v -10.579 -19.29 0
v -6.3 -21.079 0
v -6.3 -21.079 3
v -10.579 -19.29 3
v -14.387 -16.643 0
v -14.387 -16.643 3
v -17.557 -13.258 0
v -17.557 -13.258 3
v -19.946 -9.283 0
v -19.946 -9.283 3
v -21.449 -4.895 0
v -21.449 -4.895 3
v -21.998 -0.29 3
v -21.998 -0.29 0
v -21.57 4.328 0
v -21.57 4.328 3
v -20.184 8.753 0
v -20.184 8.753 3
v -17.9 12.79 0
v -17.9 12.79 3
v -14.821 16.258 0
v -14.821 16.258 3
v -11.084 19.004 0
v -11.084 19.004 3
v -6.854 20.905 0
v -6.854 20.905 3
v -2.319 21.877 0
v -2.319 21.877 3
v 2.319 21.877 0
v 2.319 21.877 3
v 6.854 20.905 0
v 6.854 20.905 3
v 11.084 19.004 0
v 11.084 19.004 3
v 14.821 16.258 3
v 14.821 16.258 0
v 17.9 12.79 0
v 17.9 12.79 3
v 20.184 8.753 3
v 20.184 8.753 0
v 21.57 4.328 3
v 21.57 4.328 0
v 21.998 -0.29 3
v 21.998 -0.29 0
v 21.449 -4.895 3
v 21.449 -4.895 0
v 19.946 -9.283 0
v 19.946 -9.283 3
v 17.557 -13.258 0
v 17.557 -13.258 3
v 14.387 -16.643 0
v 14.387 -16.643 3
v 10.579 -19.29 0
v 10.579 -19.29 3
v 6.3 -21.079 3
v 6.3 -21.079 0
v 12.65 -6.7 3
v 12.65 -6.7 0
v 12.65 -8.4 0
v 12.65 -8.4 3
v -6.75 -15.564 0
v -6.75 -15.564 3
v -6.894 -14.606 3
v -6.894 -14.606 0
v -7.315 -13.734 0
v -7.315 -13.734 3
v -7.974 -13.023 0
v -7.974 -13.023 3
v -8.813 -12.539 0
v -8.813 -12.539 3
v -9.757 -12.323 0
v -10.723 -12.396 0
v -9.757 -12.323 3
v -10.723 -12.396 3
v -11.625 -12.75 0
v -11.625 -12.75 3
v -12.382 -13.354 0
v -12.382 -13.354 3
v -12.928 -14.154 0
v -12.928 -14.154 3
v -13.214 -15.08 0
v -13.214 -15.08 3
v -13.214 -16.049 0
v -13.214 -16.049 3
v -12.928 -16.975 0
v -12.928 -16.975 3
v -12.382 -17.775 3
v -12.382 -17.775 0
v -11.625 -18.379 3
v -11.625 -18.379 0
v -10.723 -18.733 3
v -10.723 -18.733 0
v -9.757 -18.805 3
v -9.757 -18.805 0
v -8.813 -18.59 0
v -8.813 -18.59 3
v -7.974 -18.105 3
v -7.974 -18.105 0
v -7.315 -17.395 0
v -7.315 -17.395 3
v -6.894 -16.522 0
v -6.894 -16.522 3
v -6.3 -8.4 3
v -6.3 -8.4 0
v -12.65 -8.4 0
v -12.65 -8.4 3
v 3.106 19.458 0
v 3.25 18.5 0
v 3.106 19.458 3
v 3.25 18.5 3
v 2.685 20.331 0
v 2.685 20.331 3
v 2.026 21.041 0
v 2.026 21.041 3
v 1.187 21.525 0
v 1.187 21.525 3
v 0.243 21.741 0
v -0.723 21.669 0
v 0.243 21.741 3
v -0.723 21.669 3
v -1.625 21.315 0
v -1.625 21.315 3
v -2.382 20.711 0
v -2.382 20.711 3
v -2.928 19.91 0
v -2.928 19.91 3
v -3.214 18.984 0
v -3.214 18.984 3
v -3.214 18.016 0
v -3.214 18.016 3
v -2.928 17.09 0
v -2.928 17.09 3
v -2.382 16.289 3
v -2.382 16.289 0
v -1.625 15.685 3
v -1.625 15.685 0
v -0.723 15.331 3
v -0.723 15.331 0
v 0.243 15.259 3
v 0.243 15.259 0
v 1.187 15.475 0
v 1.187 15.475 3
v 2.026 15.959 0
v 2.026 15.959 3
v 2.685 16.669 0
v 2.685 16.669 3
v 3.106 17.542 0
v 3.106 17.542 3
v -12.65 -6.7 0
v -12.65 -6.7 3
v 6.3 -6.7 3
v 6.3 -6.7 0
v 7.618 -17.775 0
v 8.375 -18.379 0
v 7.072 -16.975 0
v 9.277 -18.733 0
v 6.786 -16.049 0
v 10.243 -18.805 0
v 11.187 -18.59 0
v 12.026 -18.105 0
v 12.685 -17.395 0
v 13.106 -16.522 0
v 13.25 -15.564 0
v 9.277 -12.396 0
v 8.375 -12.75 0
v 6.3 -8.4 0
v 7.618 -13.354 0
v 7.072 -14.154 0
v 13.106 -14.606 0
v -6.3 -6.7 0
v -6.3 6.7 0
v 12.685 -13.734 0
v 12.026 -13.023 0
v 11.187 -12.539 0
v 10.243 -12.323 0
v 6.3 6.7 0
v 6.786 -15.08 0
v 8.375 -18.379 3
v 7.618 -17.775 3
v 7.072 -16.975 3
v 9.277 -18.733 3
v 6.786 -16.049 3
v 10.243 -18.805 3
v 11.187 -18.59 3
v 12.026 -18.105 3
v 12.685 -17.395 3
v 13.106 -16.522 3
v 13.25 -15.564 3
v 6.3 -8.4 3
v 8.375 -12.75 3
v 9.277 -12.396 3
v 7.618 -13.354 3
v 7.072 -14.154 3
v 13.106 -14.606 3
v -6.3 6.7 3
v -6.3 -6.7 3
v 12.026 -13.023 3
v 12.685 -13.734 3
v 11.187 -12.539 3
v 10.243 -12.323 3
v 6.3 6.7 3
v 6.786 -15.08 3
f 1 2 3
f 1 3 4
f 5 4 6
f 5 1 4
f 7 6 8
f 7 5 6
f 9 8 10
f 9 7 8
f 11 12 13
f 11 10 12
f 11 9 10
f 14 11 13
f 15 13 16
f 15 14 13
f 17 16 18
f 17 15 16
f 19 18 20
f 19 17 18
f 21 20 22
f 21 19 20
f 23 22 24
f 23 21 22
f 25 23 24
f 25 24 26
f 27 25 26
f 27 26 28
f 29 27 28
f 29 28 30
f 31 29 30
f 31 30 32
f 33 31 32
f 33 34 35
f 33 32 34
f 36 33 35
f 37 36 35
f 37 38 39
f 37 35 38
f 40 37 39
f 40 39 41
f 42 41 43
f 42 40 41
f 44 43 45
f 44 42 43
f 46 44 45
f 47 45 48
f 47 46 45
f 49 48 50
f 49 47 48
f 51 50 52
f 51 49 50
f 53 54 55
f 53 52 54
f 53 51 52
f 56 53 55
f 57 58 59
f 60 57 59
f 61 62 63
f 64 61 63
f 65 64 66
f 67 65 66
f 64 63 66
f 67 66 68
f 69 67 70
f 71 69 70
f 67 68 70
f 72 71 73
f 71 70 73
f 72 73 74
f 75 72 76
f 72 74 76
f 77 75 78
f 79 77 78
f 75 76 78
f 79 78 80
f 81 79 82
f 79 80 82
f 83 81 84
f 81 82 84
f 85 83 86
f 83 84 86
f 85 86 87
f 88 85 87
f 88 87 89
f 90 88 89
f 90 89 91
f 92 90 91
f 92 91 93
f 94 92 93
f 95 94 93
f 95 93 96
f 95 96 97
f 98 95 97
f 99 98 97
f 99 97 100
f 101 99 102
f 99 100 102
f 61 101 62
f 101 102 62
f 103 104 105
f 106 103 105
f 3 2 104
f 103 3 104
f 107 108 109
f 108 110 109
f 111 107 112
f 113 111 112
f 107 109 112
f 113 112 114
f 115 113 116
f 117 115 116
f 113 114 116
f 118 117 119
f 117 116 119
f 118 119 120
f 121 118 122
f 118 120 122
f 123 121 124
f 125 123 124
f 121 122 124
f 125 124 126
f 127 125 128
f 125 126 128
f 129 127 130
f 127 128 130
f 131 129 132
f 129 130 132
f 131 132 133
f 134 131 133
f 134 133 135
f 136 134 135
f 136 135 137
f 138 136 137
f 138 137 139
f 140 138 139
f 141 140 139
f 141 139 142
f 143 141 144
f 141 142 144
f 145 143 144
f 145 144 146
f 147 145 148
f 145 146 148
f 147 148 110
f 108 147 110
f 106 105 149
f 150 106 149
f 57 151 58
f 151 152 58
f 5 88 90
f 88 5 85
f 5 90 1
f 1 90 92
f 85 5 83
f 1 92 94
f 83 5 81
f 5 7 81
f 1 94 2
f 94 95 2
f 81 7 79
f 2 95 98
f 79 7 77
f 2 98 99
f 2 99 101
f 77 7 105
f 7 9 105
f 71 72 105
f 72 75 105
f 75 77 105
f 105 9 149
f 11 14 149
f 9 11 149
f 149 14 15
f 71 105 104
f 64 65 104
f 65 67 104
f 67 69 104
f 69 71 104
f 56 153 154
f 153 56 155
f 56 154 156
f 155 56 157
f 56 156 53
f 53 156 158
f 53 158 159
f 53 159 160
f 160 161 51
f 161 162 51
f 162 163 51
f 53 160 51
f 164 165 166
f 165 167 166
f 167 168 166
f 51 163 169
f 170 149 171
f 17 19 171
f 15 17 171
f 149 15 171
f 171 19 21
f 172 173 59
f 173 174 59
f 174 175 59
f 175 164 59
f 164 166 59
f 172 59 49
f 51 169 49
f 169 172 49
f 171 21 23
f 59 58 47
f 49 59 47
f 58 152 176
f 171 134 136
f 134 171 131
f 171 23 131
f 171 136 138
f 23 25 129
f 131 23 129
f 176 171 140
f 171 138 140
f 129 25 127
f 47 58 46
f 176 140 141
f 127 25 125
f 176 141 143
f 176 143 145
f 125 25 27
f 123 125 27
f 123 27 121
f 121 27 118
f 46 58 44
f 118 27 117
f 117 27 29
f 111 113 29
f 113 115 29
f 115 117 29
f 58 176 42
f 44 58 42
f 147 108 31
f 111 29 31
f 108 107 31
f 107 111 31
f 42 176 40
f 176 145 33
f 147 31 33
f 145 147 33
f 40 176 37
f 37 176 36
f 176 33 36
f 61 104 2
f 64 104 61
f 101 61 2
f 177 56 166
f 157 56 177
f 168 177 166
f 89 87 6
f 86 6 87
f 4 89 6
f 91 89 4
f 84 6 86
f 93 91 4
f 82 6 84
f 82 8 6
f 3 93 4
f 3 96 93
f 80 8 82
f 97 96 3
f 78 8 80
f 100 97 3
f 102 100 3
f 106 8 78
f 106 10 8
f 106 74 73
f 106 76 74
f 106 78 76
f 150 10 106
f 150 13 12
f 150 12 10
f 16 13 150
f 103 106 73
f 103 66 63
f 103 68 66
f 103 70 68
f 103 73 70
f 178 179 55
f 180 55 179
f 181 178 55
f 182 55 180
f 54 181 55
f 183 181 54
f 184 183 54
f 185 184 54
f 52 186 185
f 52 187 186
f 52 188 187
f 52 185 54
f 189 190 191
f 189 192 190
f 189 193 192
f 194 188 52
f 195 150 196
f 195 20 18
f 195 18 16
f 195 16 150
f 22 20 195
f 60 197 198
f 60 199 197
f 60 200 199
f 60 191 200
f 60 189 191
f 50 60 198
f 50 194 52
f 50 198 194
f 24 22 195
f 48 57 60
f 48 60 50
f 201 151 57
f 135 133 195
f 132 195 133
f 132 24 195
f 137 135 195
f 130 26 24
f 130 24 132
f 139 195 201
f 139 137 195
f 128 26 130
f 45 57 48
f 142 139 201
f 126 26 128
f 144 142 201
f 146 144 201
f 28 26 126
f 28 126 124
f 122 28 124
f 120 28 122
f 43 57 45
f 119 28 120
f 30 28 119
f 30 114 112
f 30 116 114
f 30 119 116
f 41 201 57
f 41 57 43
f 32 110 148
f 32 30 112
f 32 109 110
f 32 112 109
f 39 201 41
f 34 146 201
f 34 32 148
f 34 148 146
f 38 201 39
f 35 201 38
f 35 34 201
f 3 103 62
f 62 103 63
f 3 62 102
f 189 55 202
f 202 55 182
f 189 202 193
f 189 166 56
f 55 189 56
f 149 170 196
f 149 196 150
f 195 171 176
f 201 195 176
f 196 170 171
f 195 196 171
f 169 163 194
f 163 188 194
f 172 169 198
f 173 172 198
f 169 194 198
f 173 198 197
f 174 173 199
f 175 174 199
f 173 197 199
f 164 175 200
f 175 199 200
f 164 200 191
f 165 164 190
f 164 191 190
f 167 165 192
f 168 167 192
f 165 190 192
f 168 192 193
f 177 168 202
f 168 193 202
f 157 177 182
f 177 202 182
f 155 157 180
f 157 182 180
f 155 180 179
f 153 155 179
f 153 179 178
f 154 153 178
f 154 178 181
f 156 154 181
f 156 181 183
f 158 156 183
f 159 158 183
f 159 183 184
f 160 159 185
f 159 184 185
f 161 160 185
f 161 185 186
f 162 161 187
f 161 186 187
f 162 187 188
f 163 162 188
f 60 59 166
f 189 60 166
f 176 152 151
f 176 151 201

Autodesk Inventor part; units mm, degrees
ref_plane "Plan YZ" through (0, 0, 0) normal (1, 0, 0) x (0, 1, 0)
ref_plane "Plan XZ" through (0, 0, 0) normal (0, 1, 0) x (-1, 0, 0)
ref_plane "Plan XY" through (0, 0, 0) normal (0, 0, 1) x (1, 0, 0)
sketch "Esquisse1" plane through (0, 0, 0) normal (0, 0, 1) x (1, 0, 0)
  arc A0 (6.3, -21.0787) -> (-6.3, -21.0787) centre (0, 0) ccw
  line L0 (-6.3, 6.7) -> (6.3, 6.7)
  line L1 (-6.3, -6.7) -> (-12.65, -6.7)
  line L2 (-12.65, -8.4) -> (-12.65, -6.7)
  line L3 (-6.3, -8.4) -> (-12.65, -8.4)
  line L4 (6.3, -6.7) -> (12.65, -6.7)
  line L5 (12.65, -6.7) -> (12.65, -8.4)
  line L6 (12.65, -8.4) -> (6.3, -8.4)
  line L7 (-30.8, 0) -> (30.8, 0) construction
  line L8 (0, -29.7044) -> (0, 30.6757) construction
  line L9 (-6.3, -21.0787) -> (-6.3, -8.4)
  line L10 (-6.3, -6.7) -> (-6.3, 6.7)
  line L11 (6.3, -8.4) -> (6.3, -21.0787)
  line L12 (6.3, -21.0787) -> (6.3, -8.4) construction
  line L13 (6.3, -21.0787) -> (6.3, -8.4)
  line L14 (6.3, -6.7) -> (6.3, 6.7)
  dimension "d0" = 44
  dimension "d47" = 1.7
  dimension "d49" = 6.35
  dimension "d52" = 12.6
  dimension "d55" = 13.4
  dimension "d56" = 6.7
extrude "Extrusion1" add sketch "Esquisse1" along normal blind 3
sketch "Esquisse7" plane through (0, 0, 3) normal (0, 0, 1) x (1, 0, 0)
  circle A0 centre (0, 18.5) radius 3.25
  circle A1 centre (10, -15.5644) radius 3.25
  circle A2 centre (-10, -15.5644) radius 3.25
  line L0 (0, -29.6944) -> (0, 30.6157) construction
  circle A3 centre (0, 0) radius 18.5 construction
  dimension "d23" = 6.5
  dimension "d34" = 20
  dimension "d51" = 37
extrude "Extrusion5" cut sketch "Esquisse7" against normal through all
properties part number "S1702_couverclerailressort" material "Plastique PMMA"
